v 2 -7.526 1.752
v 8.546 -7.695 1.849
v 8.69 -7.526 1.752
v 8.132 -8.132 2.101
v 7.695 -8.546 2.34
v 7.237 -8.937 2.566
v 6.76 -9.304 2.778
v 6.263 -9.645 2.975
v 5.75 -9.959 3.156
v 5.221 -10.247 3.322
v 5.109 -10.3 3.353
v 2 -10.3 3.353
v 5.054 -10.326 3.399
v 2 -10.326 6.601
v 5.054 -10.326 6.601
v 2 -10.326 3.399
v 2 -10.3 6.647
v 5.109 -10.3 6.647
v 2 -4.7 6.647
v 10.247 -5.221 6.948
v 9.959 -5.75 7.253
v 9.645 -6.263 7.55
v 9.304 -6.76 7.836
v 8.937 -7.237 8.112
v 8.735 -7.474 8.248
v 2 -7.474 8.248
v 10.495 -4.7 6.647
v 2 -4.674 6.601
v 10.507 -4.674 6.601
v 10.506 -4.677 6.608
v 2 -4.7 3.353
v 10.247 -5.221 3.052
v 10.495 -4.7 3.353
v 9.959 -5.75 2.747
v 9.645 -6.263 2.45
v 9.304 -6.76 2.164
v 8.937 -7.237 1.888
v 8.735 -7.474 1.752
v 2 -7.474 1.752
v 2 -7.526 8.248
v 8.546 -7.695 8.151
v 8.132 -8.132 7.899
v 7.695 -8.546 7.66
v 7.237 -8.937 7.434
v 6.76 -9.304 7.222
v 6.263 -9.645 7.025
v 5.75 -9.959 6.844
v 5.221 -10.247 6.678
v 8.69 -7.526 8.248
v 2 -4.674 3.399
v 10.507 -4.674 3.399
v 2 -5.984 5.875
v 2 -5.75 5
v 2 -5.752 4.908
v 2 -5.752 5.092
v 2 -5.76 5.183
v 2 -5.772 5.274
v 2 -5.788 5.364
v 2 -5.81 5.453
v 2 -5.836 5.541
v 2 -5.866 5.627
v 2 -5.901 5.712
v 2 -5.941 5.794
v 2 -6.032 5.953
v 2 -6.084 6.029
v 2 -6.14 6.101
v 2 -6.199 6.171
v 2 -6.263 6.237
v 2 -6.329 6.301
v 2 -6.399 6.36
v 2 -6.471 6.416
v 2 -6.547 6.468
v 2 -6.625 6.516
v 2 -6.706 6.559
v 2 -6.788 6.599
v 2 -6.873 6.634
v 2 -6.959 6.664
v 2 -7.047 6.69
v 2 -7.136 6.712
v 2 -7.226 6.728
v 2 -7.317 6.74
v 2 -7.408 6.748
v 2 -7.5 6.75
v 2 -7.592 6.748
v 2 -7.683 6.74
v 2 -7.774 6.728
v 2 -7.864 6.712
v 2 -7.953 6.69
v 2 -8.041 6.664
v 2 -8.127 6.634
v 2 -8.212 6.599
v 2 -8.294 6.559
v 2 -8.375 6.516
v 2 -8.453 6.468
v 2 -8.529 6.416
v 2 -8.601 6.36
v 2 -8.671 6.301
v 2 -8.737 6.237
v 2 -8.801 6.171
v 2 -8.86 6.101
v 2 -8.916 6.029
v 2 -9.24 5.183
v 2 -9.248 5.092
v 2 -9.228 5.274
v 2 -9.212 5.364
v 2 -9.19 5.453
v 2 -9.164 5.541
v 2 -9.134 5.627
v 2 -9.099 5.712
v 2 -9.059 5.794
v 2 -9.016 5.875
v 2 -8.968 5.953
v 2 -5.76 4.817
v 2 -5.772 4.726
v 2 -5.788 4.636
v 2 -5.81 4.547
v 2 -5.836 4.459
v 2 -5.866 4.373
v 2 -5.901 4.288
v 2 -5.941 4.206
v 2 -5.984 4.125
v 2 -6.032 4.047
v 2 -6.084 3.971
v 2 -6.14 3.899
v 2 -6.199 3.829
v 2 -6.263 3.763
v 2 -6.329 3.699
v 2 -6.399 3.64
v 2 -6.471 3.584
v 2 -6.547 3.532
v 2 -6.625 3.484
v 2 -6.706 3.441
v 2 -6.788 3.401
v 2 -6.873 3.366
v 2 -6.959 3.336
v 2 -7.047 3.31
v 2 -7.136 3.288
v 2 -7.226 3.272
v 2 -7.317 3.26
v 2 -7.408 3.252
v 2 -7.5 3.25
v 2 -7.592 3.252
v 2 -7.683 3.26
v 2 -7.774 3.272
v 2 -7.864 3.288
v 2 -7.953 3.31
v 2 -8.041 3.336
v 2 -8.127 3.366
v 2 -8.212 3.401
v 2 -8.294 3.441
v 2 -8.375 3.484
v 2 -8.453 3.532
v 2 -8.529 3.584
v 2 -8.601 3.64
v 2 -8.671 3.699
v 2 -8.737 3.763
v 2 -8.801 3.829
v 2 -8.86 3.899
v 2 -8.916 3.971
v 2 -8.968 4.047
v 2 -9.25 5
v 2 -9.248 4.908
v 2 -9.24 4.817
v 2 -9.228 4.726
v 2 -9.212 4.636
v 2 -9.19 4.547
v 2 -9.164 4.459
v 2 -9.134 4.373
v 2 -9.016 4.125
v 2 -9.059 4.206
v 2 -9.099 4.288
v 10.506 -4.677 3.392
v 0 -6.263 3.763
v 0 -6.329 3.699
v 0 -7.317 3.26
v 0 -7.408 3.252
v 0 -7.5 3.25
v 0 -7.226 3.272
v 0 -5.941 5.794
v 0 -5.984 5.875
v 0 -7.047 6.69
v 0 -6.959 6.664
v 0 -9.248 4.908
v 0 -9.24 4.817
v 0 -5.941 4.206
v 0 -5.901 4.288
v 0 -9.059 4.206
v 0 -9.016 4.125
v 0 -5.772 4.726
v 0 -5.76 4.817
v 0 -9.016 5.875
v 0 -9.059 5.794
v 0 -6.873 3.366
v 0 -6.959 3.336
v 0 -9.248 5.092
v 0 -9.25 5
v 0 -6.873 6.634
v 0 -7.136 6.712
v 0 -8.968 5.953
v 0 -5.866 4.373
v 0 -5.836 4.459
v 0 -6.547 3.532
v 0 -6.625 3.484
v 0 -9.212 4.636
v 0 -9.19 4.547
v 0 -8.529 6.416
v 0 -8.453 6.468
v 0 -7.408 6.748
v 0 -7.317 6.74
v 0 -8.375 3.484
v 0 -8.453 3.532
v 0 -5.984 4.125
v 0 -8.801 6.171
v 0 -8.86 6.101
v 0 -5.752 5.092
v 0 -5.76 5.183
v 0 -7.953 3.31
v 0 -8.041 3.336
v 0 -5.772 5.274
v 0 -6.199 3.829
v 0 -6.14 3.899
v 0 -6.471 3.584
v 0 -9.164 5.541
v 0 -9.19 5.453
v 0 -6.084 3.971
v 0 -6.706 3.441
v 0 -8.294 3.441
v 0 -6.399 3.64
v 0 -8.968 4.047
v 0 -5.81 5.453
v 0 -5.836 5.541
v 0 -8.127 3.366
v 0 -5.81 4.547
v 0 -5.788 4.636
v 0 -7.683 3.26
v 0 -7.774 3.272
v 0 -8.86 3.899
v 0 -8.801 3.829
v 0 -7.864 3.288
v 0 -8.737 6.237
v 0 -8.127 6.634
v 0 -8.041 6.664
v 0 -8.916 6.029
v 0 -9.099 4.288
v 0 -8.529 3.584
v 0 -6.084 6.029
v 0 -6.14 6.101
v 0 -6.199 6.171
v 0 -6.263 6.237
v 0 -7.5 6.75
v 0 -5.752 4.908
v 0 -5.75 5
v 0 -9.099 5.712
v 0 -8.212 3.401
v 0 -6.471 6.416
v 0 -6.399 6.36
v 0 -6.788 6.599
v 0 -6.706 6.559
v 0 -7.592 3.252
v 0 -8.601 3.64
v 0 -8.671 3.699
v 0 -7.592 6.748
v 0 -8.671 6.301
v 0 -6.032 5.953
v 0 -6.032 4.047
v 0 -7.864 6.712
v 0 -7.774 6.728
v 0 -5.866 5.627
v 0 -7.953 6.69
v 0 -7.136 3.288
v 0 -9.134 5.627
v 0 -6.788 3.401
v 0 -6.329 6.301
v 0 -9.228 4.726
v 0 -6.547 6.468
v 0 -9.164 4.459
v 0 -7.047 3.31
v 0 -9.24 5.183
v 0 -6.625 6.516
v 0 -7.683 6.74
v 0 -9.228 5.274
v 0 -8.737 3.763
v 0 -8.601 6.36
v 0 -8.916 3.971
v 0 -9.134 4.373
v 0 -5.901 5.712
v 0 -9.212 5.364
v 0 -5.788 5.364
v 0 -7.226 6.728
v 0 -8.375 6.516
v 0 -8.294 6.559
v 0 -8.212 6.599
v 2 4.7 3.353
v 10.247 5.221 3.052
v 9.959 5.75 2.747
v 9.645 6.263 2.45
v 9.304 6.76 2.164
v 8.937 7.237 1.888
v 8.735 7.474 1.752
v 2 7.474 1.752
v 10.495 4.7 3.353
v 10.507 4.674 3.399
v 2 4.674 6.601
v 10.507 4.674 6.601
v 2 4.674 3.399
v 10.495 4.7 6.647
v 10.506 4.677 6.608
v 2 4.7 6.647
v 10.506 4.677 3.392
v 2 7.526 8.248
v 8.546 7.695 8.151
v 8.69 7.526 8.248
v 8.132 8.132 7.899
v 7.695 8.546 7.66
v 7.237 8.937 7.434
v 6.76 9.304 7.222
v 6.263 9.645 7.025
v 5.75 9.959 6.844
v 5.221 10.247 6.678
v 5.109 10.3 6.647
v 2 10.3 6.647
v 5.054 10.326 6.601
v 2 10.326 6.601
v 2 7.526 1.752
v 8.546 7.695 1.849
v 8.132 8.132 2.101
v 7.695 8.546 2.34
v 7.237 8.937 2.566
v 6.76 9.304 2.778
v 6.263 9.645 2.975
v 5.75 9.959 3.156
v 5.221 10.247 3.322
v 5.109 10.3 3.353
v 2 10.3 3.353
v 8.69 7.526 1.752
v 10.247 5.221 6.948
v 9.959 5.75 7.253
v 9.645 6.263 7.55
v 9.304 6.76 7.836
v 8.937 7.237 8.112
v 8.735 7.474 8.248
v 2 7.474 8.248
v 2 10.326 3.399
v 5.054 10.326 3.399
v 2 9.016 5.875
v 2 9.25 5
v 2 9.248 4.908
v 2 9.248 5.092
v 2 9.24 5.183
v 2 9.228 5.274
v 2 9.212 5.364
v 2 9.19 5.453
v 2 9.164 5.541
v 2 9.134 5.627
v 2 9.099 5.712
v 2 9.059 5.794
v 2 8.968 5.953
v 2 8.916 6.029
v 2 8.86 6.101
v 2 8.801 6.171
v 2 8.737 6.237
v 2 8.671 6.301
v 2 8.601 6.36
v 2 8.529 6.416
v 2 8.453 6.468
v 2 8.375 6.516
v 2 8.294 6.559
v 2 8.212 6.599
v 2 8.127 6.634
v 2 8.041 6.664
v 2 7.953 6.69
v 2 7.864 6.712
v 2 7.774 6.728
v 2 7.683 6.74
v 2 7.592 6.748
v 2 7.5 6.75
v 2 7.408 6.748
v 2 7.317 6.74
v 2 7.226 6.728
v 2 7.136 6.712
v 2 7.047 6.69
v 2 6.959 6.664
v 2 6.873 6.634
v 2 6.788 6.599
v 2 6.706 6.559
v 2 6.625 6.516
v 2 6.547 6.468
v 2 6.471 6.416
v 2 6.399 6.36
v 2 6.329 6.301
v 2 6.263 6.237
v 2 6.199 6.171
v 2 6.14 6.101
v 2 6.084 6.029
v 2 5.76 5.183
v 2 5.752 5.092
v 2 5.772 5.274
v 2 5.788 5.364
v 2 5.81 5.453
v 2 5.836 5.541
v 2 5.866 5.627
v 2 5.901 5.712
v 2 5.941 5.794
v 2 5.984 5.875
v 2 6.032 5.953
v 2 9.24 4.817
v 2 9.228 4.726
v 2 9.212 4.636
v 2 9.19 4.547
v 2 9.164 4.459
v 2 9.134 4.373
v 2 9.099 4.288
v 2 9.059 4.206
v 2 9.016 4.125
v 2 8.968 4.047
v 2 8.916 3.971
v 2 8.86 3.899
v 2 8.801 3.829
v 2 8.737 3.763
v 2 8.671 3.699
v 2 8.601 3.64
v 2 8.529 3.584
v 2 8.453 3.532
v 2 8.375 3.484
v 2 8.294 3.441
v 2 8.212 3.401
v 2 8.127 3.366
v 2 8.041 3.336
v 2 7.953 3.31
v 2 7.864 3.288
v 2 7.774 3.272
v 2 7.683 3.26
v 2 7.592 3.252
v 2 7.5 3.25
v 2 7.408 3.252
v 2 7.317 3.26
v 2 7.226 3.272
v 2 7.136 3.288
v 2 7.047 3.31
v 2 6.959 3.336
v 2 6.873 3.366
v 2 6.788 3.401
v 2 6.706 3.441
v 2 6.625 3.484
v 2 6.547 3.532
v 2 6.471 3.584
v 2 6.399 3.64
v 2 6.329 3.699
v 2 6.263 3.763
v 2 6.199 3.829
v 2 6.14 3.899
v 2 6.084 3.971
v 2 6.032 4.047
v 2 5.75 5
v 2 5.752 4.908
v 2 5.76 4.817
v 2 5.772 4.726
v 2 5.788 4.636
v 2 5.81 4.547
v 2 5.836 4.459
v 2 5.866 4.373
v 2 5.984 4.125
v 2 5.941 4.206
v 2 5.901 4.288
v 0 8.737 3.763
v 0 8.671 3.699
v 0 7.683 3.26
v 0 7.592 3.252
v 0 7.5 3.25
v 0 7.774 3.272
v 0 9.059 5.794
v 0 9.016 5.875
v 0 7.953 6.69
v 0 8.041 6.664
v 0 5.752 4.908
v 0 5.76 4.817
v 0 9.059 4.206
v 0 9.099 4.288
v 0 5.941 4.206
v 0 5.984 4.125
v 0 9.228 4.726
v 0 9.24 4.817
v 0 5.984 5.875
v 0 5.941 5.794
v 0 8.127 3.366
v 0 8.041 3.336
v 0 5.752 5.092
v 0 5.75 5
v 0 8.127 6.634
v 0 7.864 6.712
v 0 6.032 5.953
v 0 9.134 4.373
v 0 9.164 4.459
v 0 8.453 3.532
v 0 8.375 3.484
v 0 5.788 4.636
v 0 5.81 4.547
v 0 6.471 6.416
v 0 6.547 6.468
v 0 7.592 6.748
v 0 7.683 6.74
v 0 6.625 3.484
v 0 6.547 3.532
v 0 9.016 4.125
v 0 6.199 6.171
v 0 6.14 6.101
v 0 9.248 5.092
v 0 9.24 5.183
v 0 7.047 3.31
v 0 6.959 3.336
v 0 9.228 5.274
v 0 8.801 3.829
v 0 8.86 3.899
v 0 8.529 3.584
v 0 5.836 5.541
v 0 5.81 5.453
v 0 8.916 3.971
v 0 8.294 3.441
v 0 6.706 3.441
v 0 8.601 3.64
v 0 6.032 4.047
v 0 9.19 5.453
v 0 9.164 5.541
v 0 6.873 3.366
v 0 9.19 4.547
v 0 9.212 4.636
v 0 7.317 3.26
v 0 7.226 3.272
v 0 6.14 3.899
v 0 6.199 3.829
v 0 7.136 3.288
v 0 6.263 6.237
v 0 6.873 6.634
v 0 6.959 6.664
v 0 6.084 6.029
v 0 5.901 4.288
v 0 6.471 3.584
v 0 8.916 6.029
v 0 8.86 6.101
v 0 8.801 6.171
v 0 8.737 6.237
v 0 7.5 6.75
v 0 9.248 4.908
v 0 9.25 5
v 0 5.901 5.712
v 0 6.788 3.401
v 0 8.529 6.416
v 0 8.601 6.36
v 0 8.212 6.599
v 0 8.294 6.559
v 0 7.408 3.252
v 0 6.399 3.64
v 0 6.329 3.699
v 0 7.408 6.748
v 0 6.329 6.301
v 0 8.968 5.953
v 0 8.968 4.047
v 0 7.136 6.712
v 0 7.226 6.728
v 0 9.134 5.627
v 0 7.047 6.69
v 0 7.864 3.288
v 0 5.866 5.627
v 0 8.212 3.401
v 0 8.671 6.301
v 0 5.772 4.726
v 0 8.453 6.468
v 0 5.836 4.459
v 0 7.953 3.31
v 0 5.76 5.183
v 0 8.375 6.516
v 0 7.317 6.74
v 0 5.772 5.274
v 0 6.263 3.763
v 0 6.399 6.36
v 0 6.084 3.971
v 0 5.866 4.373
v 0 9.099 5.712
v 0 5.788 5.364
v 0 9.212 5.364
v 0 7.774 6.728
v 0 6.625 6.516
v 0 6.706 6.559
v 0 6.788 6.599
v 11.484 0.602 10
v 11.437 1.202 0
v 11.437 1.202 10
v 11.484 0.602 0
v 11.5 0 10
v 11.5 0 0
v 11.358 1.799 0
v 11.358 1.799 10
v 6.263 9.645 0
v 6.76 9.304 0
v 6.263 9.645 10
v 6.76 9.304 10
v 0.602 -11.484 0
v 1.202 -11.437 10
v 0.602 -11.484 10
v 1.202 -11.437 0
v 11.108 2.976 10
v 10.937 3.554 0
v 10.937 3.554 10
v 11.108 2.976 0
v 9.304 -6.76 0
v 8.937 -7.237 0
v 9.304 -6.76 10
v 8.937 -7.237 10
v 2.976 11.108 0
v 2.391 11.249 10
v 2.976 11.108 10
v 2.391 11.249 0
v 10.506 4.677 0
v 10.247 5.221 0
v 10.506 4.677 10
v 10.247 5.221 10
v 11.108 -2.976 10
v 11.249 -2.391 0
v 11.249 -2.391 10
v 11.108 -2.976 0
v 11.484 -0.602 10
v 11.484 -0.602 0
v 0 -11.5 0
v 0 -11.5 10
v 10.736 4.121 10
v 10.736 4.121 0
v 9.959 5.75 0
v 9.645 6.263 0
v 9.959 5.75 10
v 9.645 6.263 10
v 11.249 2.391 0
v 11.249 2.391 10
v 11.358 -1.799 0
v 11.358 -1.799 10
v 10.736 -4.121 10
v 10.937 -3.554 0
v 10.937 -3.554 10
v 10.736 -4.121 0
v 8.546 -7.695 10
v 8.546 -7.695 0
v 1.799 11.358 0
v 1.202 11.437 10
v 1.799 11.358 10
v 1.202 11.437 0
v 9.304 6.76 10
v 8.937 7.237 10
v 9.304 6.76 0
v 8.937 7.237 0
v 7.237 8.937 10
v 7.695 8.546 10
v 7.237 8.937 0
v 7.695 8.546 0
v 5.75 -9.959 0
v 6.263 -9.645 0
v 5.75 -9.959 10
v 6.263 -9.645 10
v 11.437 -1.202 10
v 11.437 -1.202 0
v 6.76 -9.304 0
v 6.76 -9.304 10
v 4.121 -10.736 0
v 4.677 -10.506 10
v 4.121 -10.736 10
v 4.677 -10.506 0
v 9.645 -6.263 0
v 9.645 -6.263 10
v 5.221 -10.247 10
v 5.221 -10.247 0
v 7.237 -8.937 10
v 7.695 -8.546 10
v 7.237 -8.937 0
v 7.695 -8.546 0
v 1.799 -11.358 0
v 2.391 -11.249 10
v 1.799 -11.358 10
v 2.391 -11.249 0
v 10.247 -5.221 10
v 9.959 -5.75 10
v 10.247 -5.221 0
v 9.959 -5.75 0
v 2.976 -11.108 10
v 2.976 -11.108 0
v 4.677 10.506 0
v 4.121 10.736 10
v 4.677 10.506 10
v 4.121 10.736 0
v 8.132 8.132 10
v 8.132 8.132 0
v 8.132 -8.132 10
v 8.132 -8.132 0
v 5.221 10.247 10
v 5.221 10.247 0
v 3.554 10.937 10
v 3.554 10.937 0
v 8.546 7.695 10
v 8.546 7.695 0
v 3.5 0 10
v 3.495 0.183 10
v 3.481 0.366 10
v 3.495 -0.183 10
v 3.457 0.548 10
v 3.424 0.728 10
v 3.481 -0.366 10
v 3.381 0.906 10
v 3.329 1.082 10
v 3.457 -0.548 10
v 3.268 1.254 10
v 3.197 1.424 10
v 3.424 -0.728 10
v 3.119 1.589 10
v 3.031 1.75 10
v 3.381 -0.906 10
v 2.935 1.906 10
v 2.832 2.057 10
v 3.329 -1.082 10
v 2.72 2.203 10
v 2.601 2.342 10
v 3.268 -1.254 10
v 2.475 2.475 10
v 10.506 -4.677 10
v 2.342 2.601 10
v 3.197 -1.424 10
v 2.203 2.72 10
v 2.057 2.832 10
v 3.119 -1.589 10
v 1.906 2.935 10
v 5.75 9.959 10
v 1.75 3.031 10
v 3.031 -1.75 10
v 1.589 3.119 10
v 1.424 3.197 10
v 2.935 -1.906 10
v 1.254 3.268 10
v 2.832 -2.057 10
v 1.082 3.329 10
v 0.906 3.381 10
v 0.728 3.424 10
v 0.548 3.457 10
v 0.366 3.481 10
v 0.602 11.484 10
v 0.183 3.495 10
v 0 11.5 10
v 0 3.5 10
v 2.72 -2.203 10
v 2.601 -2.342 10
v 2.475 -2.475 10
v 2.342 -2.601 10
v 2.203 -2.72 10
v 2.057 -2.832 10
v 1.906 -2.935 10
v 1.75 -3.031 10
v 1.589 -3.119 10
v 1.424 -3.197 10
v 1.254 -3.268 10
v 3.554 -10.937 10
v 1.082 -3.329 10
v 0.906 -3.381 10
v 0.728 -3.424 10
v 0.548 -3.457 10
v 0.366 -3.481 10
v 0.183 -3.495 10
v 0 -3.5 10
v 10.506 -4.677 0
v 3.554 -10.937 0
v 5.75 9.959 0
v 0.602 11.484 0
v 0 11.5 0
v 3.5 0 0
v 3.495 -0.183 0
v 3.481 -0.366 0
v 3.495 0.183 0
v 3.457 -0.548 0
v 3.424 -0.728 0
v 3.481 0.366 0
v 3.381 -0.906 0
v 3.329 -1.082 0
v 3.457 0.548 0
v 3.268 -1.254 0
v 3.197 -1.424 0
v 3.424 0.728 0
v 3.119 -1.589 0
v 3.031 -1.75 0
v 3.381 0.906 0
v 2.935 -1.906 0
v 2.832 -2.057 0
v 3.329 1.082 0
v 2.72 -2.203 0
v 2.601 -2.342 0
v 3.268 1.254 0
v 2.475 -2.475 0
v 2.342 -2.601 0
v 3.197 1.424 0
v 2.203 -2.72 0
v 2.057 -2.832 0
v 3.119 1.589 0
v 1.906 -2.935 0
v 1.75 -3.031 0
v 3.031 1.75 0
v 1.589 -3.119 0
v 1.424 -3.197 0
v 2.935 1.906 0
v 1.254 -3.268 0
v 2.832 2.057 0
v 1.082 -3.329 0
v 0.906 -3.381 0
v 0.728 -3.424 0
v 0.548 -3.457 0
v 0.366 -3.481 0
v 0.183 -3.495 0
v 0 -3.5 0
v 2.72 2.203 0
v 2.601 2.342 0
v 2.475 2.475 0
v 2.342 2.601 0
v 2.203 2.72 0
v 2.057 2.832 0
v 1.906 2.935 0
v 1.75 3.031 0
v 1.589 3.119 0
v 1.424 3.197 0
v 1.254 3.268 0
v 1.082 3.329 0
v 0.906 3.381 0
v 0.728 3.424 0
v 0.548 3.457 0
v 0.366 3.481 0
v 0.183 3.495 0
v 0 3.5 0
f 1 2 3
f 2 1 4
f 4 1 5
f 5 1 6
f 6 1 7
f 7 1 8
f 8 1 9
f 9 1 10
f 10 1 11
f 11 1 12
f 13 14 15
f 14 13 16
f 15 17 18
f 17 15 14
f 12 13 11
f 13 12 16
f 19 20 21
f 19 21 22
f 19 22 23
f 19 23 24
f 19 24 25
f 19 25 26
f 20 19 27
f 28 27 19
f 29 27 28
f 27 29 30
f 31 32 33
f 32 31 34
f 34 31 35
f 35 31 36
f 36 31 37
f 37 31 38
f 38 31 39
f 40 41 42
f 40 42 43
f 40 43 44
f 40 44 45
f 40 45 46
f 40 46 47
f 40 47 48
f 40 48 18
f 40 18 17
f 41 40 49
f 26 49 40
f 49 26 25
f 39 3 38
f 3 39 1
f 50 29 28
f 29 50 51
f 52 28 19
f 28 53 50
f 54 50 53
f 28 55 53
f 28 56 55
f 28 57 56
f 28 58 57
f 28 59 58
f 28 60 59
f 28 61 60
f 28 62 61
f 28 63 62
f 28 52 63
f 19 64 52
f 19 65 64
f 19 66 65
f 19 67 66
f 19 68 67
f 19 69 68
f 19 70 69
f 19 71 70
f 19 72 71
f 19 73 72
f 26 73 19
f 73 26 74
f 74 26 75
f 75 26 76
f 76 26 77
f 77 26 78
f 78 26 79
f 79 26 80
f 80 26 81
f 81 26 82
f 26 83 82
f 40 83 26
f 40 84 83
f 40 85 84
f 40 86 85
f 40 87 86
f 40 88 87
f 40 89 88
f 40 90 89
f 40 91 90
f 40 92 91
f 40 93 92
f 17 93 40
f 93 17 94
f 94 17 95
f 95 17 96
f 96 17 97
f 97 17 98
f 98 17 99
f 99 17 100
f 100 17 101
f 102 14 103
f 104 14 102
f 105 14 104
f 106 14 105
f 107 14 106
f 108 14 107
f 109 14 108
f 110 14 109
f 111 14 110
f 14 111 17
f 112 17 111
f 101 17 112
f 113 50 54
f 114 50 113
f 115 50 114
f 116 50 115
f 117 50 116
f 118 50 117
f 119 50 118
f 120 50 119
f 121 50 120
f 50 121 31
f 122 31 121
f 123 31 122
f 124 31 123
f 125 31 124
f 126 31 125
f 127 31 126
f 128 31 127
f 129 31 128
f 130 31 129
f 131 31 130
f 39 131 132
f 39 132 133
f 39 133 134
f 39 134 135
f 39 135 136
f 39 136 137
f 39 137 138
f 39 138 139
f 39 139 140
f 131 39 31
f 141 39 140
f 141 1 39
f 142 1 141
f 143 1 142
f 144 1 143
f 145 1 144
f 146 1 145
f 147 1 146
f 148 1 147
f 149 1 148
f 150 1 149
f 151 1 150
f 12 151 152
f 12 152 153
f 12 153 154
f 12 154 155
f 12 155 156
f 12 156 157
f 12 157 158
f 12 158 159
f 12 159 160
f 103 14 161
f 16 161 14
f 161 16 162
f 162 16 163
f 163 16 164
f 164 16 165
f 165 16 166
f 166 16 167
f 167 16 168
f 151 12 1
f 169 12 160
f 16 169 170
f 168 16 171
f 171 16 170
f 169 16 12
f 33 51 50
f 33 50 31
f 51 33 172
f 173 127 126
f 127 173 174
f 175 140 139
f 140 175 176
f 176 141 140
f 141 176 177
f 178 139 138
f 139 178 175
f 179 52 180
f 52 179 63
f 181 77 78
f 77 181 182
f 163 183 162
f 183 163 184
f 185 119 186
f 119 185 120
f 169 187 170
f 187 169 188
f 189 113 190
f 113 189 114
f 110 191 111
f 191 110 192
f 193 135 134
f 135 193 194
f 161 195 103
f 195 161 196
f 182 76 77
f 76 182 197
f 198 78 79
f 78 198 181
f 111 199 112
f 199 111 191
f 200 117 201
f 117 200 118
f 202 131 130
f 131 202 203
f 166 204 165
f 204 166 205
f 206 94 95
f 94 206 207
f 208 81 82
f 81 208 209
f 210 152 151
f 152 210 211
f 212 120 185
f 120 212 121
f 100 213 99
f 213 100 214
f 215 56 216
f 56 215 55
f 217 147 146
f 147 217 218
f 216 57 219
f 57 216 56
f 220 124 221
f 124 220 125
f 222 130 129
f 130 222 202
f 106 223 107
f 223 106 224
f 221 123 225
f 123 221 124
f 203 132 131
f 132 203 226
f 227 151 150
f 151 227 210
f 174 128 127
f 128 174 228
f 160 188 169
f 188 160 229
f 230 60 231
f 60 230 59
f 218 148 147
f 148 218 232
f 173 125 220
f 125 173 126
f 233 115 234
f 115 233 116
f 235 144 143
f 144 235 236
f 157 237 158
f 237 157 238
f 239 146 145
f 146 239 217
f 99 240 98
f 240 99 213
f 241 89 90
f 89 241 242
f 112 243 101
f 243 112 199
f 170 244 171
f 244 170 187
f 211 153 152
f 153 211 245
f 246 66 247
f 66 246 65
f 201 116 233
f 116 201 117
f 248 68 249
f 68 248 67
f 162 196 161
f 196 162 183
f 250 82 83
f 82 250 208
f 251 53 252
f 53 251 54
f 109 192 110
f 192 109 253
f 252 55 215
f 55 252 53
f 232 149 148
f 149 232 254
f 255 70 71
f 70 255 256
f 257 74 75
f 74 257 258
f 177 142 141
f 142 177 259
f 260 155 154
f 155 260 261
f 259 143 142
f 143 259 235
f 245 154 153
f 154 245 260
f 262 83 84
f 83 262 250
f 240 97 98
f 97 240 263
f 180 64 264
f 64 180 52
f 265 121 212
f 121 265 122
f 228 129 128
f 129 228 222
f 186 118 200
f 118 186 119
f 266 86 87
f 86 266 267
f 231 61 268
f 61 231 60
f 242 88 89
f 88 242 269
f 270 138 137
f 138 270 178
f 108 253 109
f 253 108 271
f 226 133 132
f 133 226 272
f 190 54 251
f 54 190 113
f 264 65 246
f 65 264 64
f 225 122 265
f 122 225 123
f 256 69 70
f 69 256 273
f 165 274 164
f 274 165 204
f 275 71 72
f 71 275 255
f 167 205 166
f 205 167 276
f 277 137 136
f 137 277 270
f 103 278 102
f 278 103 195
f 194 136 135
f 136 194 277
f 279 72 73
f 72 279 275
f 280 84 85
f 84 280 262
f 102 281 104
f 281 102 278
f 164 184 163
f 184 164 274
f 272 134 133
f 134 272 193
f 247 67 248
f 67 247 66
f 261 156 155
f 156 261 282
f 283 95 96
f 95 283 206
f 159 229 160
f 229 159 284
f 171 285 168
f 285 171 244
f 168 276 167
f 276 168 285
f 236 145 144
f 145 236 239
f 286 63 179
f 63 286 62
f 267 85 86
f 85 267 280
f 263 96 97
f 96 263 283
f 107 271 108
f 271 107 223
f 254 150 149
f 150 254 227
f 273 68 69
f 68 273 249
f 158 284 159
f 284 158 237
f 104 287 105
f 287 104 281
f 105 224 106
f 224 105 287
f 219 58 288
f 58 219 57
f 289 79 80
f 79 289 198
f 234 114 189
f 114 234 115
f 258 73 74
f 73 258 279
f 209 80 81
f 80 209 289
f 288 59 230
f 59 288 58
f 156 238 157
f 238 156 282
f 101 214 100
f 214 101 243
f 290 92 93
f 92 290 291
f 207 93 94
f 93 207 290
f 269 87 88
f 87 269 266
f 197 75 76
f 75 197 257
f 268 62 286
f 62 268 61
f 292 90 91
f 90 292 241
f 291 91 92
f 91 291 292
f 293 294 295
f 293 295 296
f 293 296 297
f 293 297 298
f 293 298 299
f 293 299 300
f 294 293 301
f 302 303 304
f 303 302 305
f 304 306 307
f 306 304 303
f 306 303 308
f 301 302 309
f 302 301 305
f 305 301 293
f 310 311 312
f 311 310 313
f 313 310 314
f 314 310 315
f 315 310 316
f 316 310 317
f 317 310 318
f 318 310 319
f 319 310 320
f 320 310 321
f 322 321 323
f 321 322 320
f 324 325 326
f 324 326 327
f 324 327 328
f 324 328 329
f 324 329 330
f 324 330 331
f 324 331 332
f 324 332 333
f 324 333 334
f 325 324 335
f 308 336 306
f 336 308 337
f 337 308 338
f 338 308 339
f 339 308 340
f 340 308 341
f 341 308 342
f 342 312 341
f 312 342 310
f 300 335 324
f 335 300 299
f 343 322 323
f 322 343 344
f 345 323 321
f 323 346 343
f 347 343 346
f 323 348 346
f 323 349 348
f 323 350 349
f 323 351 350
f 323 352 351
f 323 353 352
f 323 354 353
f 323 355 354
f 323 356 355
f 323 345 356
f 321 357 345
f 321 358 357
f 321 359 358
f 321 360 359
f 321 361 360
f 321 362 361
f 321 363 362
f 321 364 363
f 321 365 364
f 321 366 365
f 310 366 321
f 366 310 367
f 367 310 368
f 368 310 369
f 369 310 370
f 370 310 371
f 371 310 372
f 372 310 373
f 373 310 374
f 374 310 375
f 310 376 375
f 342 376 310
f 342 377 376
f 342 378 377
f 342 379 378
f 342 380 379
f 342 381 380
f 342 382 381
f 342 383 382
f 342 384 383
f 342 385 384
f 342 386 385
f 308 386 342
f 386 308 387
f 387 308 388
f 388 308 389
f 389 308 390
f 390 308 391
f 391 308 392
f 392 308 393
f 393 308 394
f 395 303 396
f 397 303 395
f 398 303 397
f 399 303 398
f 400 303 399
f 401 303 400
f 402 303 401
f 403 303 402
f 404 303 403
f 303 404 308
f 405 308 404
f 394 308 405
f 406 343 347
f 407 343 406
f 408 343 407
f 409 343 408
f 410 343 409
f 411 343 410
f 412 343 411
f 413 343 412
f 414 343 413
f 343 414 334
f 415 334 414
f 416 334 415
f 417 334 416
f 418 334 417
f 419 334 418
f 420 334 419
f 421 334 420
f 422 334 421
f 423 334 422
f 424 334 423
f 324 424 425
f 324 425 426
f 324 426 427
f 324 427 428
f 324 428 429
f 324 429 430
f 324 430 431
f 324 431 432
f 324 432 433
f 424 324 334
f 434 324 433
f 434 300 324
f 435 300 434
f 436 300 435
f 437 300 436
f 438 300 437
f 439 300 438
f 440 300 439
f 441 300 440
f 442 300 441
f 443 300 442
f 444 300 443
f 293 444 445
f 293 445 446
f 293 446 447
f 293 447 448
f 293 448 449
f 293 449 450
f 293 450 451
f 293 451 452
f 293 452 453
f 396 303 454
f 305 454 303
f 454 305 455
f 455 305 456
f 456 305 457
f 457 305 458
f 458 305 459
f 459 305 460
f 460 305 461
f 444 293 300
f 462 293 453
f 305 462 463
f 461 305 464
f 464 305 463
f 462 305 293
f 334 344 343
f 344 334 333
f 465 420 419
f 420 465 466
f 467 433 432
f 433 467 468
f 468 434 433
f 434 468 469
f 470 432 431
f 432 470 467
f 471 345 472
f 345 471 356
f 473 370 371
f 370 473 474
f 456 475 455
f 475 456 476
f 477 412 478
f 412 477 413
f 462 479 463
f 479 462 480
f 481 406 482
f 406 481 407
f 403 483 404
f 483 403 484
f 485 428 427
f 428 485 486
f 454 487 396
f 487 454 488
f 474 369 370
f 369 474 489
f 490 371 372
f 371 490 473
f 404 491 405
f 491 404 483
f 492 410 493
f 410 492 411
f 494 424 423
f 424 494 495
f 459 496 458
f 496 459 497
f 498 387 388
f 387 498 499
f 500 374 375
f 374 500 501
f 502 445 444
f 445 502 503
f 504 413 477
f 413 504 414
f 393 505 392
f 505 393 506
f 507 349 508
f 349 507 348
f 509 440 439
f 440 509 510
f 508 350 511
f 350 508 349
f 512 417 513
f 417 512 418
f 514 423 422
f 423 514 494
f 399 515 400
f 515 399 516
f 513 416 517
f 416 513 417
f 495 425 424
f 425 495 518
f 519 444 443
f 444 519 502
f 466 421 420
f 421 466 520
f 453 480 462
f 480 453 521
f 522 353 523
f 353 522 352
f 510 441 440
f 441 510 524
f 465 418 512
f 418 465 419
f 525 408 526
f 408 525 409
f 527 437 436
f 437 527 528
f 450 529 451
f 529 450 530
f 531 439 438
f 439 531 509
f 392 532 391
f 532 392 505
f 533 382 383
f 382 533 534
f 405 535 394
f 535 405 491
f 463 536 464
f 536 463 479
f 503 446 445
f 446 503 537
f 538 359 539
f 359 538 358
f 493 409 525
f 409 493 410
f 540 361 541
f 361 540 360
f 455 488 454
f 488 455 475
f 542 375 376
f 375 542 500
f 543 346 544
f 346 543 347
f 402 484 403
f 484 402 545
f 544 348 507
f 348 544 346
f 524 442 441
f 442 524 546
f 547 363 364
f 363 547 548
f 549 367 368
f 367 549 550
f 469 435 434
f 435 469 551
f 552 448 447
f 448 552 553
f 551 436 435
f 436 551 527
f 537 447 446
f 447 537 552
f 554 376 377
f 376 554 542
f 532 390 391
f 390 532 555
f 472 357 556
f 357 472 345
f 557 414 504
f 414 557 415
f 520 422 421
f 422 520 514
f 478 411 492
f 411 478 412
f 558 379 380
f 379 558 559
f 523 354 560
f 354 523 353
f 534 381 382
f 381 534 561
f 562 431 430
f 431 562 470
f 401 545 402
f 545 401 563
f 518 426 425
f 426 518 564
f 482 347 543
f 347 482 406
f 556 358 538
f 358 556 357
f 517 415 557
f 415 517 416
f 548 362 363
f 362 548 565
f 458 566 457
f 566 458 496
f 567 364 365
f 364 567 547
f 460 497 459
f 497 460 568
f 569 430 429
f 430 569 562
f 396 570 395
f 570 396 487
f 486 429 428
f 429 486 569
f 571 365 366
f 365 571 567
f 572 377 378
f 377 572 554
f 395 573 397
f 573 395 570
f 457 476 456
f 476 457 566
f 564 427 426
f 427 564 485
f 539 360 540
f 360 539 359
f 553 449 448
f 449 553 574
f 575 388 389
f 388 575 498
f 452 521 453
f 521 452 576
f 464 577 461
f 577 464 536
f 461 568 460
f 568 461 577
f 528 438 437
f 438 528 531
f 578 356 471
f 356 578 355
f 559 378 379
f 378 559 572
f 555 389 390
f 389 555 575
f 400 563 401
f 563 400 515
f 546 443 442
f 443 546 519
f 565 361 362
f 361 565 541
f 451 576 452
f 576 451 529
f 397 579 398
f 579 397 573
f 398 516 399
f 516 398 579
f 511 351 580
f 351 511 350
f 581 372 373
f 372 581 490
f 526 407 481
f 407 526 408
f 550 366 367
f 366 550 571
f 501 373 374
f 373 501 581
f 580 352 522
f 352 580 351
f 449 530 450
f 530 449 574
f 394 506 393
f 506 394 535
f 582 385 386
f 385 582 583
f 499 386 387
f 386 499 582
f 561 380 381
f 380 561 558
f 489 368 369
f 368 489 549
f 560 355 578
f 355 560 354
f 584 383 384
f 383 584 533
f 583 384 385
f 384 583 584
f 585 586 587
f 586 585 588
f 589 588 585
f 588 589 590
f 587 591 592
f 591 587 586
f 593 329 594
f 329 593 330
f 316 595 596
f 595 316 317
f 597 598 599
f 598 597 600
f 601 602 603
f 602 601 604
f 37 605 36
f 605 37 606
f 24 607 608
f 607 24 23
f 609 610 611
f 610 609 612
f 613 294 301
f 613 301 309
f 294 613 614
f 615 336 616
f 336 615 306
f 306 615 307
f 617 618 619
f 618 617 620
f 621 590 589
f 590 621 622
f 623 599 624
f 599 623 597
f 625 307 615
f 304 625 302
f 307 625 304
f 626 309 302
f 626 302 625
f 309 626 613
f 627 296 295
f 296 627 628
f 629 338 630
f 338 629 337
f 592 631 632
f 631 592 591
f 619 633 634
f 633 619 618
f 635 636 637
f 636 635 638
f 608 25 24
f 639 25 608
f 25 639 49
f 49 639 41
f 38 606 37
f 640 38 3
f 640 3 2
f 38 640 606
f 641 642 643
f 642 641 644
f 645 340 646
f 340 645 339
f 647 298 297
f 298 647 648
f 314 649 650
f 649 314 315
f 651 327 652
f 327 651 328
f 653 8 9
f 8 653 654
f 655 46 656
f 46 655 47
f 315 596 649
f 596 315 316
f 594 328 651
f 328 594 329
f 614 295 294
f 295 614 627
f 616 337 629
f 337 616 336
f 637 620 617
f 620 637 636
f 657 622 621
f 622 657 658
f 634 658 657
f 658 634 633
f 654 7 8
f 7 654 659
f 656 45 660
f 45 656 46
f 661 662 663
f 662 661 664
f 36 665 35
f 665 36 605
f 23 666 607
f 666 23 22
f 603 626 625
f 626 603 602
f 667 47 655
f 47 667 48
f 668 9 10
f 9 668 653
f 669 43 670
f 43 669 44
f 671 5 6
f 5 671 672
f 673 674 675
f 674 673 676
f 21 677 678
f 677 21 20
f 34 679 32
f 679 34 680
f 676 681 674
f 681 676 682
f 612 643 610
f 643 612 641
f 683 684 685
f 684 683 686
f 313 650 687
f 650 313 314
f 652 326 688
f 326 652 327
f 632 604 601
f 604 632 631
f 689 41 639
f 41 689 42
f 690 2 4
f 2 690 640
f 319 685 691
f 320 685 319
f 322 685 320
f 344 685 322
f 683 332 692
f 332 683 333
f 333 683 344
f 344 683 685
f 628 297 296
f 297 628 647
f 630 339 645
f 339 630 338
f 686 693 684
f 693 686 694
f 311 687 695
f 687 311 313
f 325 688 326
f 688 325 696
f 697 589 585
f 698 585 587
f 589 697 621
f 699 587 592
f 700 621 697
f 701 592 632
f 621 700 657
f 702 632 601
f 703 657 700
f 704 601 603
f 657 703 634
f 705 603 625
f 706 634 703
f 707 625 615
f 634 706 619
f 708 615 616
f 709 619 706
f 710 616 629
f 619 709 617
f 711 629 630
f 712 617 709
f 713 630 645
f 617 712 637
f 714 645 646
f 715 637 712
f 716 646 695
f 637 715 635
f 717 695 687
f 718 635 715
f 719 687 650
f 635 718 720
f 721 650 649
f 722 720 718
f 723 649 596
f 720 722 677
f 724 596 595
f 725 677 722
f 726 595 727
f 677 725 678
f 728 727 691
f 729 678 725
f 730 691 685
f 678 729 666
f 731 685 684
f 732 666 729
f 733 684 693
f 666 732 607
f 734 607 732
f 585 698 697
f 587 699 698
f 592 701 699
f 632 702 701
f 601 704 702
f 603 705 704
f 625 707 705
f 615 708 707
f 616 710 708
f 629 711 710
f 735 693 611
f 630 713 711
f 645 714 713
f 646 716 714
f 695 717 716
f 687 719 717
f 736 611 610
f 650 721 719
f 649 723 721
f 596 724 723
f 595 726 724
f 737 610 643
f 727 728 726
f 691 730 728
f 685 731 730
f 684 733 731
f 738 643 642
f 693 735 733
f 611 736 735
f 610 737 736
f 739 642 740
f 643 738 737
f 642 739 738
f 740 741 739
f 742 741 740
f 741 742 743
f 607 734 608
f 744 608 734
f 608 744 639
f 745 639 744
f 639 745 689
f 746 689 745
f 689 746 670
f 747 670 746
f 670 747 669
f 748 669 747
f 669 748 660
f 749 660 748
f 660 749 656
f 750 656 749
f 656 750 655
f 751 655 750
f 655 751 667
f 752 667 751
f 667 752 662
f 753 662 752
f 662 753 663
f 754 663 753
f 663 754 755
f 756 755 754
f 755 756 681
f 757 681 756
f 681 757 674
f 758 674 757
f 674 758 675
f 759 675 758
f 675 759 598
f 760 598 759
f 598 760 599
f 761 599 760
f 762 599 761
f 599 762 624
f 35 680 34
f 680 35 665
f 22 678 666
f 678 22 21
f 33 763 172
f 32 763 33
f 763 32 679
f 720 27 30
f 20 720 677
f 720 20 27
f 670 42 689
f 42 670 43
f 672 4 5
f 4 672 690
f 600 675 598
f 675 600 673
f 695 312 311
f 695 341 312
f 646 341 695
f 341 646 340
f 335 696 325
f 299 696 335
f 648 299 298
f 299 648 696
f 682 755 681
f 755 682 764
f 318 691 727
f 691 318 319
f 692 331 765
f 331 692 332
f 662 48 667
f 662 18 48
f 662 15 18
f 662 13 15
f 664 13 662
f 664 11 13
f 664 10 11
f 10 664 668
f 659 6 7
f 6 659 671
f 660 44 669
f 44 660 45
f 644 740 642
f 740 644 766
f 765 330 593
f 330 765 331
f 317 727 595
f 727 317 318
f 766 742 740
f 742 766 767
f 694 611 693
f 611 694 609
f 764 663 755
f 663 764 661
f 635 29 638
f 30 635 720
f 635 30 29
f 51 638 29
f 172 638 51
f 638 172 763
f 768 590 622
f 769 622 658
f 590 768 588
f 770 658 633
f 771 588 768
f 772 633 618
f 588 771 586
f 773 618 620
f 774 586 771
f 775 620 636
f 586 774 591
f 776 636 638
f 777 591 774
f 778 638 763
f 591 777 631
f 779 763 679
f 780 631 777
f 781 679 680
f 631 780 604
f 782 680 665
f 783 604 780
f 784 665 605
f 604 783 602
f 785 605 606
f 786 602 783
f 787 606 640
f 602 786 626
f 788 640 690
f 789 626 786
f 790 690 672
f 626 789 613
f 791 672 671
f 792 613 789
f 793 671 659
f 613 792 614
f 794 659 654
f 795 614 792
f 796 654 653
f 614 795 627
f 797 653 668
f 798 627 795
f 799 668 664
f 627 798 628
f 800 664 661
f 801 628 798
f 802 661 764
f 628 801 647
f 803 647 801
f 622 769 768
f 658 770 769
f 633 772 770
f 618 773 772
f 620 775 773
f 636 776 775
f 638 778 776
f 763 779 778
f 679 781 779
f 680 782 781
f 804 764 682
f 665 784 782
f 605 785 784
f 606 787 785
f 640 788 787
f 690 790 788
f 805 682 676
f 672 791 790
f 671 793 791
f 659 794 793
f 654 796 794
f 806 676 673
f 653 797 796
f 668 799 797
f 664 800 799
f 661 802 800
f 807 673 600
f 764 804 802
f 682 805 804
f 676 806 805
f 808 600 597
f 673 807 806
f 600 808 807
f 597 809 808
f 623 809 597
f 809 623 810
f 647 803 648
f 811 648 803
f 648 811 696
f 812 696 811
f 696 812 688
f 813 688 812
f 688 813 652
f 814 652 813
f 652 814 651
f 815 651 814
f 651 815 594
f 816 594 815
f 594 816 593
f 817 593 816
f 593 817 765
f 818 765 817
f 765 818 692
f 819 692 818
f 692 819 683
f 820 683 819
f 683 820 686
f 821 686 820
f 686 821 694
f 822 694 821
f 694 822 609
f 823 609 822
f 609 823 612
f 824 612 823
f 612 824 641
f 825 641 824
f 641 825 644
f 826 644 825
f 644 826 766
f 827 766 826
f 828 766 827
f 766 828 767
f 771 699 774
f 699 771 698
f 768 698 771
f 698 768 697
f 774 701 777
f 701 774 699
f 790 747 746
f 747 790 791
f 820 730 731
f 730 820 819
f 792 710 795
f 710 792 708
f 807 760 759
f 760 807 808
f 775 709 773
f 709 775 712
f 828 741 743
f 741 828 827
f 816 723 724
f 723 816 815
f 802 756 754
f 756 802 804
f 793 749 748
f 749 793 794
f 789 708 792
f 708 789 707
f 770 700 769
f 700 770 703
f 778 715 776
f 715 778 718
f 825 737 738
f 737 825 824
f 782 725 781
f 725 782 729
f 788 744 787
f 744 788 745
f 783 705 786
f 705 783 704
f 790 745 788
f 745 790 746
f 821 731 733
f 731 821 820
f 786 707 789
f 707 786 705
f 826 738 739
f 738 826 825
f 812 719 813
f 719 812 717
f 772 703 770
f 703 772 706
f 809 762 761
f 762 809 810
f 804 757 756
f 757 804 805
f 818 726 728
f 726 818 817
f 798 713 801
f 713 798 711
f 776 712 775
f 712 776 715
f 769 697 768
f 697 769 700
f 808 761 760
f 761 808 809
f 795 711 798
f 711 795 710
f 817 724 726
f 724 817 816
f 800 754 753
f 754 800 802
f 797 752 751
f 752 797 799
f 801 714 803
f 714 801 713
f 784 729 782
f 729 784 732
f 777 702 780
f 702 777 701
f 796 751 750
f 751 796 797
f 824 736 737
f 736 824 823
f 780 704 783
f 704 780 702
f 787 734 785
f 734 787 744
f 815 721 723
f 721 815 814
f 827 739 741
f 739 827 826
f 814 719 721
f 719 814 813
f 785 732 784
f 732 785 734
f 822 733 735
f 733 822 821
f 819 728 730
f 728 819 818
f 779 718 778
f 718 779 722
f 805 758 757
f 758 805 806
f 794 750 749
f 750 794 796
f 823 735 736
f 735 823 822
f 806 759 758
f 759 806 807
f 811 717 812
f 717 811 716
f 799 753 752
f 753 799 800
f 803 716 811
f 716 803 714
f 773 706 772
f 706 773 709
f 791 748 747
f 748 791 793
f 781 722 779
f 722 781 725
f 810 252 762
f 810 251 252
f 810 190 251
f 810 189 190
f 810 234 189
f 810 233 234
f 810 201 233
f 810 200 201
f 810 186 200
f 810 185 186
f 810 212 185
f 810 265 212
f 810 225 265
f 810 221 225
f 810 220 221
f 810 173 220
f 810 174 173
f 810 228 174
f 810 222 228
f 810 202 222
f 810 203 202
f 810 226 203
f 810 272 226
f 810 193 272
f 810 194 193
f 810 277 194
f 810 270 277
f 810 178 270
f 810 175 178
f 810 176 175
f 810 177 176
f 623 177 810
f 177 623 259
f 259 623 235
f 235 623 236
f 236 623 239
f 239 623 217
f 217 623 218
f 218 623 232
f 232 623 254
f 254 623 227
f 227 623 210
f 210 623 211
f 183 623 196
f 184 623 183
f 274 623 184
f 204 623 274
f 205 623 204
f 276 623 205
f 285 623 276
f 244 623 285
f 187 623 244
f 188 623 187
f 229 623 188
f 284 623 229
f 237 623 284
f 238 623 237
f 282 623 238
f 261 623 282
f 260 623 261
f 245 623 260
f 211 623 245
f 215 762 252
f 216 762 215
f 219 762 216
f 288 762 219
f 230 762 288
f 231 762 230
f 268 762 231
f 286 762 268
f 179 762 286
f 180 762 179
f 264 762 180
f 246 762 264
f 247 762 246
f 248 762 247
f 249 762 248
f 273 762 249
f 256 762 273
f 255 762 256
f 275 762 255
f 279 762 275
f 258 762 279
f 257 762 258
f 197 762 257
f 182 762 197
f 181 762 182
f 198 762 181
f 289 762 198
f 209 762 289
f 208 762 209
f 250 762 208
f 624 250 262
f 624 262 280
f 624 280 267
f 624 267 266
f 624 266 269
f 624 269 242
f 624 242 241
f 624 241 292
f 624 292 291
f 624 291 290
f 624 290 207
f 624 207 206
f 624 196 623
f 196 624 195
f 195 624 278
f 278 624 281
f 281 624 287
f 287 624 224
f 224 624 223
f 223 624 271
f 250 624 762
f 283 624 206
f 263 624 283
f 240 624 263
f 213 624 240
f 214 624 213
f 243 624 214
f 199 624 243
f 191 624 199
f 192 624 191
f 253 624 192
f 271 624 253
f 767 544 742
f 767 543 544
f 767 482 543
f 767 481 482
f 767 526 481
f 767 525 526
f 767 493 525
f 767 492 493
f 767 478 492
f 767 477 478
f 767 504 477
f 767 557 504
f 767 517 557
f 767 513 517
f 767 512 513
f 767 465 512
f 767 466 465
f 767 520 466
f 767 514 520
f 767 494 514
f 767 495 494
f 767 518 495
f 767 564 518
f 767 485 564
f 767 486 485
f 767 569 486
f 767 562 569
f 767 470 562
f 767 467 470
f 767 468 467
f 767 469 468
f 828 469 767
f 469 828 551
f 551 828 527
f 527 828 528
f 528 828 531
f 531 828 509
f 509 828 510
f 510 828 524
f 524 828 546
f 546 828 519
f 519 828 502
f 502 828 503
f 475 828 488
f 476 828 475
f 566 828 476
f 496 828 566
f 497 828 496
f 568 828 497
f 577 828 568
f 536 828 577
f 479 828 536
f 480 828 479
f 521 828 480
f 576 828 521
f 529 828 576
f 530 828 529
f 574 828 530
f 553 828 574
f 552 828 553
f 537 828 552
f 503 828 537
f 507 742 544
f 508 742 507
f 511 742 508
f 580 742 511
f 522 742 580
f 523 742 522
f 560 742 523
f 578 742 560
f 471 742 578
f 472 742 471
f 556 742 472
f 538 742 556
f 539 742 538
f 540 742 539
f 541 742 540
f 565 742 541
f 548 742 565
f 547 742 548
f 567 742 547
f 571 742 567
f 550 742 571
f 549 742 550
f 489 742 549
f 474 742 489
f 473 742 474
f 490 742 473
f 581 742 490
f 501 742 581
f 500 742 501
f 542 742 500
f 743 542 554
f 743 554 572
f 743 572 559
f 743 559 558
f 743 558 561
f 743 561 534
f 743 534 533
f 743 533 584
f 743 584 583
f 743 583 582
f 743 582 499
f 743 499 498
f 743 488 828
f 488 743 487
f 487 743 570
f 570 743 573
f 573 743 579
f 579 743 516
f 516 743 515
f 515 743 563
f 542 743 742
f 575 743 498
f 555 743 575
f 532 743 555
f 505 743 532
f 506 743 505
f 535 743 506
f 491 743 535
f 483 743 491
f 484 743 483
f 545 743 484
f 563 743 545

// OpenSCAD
// file: fhex.scad
m2_5_hex_nut=5; //4.94
m2_5_nut_height=1.85;
m3_hex_nut=5.6;
m3_nut_height=2.25;
m4_hex_nut=7.2;
m4_nut_height=2.9;
m5_hex_nut=7.8;
m5_nut_height=3.9;

module fhex(wid,height){
  hull(){
    cube([wid/1.7,wid,height],center=true);
    rotate([0,0,120]) cube([wid/1.7,wid,height], center=true);
    rotate([0,0,240]) cube([wid/1.7,wid,height], center=true);
  }
}
// main file
include <fhex.scad>

//%translate([165,-150,0])
//import("../printer/pi/pi4_bottom.stl");
//
//base_thickness=1;
//screw_hole=4;
//difference(){
//  hull(){
//    translate([47.5,0,0]) cylinder(d=15, h=base_thickness);
//    for(Y=[-1,1]) translate([-47.5,37.5*Y,0]) cylinder(d=15, h=base_thickness);
//  }
//  translate([47.5,0,-1]) cylinder(d=screw_hole, h=base_thickness+2);
//  for(Y=[-1,1]) translate([-47.5,37.5*Y,-1]) 
//    cylinder(d=screw_hole, h=base_thickness+2);
//}

$fn=120;
//%import("../printer/MPMU_D6_Y-Axis_Endstop_Spacer.stl");
//y_offset();
y_offset(false);

module y_offset(top=true,dia=23){
  if(top){
    difference(){
      y_offset_internal(dia=dia);
      translate([15,0,5]) cube([30,30,20],center=true);
    }
  }
  else{
    intersection(){
      y_offset_internal(dia=dia);
      translate([15,0,5]) cube([30,30,20],center=true);
    }
  }
}

module y_offset_internal(dia=23){
  difference(){
    cylinder(d=dia,h=10);
    translate([0,0,-1]) cylinder(d=7,h=12);
    
    for(Y=[-1,1]) translate([0,Y*7.5,5]) rotate([0,90,0]){
      translate([0,0,7]) fhex(m3_hex_nut,10);
      cylinder(d=3.5,h=30,center=true);
      translate([0,0,-14]) cylinder(d=9,h=10);
    }
  }
}
